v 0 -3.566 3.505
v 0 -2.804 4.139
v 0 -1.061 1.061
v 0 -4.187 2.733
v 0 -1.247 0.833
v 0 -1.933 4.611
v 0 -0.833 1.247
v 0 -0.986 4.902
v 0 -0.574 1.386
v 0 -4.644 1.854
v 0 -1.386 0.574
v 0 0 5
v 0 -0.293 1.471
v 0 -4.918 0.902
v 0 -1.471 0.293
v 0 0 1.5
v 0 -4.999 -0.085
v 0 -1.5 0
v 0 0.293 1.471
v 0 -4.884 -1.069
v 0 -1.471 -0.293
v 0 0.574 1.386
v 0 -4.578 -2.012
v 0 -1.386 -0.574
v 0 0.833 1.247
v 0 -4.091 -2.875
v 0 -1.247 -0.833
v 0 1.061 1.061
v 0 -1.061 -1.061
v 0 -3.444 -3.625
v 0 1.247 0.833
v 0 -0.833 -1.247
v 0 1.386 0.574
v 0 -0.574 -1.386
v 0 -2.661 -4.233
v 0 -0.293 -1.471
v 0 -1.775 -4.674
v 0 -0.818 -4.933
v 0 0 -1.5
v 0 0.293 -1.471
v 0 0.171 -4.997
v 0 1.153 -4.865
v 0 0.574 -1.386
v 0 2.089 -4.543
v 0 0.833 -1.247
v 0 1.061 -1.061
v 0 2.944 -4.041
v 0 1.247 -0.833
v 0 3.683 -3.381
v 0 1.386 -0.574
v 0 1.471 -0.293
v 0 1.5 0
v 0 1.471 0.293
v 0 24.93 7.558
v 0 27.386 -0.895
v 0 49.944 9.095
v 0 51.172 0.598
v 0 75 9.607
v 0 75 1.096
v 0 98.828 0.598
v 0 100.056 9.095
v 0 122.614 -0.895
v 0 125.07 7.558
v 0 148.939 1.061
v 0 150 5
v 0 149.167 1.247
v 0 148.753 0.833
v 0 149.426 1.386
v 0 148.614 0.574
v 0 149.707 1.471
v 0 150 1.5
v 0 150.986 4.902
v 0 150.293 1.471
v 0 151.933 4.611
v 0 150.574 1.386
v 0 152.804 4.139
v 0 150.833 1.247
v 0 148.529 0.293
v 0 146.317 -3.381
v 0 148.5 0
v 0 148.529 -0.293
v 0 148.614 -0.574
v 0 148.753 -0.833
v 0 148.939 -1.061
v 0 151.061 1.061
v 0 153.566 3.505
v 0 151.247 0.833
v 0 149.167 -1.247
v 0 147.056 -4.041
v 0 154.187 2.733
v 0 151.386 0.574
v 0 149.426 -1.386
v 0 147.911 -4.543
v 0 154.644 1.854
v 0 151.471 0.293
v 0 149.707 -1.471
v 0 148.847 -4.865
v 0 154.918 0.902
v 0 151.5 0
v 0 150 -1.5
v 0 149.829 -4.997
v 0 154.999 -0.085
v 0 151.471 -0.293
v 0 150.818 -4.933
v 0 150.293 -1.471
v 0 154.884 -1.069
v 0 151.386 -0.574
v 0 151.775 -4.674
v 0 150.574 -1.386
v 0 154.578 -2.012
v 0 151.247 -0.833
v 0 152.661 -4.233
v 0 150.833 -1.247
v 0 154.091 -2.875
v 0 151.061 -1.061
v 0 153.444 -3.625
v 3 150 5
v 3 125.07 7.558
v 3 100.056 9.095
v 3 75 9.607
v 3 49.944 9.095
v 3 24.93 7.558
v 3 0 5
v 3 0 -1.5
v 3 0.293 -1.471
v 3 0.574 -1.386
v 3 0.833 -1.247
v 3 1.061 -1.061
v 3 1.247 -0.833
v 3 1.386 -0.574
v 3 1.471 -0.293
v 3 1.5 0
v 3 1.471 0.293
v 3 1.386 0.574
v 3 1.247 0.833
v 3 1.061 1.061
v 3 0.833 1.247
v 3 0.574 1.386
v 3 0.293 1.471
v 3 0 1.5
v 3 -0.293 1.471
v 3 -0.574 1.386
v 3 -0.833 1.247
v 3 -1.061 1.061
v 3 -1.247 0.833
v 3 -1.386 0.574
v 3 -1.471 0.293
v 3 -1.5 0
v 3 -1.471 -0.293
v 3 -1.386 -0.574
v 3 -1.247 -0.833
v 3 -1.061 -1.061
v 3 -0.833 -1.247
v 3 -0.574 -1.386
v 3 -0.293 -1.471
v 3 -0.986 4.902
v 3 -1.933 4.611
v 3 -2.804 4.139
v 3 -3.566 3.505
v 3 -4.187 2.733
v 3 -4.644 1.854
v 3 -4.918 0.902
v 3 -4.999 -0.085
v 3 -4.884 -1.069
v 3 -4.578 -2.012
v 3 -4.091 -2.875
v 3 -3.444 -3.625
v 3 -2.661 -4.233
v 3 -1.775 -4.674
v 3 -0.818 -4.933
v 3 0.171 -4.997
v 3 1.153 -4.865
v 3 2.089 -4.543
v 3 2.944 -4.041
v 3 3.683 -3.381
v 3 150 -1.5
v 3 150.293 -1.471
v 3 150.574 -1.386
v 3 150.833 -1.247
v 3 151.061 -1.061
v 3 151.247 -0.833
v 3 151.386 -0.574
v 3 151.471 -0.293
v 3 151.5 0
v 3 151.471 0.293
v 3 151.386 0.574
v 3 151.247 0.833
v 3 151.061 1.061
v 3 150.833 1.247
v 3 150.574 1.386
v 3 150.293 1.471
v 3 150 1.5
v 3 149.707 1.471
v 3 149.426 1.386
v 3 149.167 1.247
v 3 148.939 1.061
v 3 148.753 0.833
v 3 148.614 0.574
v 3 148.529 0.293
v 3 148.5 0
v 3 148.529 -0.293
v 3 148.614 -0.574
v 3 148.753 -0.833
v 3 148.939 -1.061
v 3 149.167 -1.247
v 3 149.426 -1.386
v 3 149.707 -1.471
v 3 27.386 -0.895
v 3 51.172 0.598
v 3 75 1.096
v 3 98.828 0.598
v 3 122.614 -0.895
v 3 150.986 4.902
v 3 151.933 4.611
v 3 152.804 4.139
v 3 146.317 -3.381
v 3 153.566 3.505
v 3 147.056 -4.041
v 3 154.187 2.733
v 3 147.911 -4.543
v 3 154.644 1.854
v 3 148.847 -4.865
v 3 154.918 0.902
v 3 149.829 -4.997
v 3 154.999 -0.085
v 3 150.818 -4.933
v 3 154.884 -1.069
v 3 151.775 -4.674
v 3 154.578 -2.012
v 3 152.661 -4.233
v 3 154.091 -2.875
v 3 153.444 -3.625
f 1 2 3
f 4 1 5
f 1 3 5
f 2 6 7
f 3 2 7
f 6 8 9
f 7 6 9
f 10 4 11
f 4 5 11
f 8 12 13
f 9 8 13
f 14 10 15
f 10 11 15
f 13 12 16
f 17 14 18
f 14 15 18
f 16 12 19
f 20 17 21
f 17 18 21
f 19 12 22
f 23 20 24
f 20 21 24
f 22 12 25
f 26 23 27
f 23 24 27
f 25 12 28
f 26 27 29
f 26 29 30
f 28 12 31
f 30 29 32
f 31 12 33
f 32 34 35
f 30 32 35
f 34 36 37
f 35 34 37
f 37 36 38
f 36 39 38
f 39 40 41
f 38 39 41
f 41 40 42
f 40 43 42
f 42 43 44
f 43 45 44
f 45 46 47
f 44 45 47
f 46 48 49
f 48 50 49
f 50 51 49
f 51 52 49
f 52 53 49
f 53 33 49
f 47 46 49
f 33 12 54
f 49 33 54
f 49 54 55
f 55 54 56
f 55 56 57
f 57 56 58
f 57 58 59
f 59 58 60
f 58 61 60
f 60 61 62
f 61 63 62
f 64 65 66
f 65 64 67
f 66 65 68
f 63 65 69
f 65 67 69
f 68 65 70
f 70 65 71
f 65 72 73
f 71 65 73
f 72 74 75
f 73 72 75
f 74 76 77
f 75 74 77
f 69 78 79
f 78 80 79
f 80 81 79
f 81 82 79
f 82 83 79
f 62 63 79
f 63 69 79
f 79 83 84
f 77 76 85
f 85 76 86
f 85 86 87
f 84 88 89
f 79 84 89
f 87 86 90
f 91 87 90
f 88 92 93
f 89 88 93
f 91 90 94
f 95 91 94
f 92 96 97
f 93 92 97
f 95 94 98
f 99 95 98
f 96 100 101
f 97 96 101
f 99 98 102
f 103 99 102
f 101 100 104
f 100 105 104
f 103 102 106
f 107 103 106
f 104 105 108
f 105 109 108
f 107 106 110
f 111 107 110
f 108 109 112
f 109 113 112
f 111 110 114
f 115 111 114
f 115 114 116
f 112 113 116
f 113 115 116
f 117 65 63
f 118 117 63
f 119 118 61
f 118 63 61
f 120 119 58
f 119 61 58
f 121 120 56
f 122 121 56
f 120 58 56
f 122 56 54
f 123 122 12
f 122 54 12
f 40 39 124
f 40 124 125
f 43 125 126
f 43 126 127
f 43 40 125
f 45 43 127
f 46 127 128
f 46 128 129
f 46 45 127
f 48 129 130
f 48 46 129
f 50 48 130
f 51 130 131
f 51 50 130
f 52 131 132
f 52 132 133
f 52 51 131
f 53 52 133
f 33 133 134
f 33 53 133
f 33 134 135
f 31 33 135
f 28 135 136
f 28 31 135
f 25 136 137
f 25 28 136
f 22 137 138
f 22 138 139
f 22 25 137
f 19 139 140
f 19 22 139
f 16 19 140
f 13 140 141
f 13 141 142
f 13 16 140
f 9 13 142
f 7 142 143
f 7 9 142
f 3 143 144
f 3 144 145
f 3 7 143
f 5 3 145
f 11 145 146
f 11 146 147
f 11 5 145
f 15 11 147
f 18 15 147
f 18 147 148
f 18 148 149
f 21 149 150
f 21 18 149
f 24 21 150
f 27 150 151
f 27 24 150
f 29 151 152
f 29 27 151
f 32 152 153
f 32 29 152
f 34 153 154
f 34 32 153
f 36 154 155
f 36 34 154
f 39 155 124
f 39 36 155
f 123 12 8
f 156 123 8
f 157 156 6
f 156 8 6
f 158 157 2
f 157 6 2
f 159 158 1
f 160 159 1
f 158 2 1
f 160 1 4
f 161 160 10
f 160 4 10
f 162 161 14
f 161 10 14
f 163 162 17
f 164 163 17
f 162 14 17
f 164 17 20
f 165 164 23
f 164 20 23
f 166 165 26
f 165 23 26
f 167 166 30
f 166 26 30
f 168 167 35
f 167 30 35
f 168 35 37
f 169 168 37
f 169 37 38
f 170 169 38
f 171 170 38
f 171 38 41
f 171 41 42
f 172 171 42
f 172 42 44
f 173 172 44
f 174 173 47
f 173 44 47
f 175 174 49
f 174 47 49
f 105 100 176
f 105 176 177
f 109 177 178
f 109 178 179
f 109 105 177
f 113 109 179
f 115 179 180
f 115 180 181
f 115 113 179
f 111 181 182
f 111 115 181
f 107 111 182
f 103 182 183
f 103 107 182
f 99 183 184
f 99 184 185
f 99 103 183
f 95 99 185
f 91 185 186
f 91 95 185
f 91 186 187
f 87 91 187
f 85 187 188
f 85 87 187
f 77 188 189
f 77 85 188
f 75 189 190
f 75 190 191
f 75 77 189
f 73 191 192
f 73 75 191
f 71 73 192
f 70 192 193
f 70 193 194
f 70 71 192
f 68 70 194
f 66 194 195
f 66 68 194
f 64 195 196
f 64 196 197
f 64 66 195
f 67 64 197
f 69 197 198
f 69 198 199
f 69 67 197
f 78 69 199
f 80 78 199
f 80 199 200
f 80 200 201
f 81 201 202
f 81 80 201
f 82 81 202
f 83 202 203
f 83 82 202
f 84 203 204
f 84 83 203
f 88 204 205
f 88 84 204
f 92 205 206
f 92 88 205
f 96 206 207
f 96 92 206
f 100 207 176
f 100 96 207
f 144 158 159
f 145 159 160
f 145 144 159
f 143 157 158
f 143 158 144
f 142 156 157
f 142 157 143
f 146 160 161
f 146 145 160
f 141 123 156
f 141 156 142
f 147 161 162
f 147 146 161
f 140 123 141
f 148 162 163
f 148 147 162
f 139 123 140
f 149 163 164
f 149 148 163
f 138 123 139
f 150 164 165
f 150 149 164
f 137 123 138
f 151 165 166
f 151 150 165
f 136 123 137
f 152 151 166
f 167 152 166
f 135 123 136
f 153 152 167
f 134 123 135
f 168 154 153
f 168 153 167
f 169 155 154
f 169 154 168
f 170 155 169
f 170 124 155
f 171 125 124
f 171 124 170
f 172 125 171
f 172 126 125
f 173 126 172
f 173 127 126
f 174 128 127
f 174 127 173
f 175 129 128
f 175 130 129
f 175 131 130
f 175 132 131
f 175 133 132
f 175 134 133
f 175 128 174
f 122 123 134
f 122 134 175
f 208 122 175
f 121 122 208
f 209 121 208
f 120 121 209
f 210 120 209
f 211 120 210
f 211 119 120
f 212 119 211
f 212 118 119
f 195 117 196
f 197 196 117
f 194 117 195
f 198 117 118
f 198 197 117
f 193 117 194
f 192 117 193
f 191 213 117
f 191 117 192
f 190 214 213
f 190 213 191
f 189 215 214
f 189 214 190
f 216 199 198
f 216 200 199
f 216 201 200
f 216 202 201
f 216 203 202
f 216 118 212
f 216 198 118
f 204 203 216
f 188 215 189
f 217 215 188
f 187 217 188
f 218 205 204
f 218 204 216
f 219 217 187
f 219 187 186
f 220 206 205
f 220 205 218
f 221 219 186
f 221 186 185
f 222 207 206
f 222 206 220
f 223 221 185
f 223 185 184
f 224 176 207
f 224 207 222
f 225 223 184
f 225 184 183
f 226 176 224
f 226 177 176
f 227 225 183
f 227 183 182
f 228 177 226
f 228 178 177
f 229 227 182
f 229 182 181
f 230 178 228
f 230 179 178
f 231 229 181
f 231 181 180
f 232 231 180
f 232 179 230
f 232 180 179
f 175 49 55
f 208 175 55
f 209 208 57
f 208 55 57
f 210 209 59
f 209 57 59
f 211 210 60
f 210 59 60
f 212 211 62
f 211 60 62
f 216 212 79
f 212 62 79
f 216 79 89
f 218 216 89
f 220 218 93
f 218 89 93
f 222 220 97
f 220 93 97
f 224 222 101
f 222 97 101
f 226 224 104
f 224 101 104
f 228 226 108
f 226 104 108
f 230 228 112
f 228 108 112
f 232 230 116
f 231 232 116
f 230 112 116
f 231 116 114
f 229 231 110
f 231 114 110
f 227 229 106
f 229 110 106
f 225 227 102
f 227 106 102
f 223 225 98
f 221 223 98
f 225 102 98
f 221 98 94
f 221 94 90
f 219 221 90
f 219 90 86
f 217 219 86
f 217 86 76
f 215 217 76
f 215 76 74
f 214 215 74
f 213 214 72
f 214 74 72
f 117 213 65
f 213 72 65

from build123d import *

# Parameters (mm, degrees)
CROQUIS1_R              = 1.5
SALIENTE_EXTRUIR1_DEPTH = 3


with BuildPart() as part:
    # Croquis1 → Saliente-Extruir1 (new body)
    with BuildSketch(Plane(origin=(0, 0, 0), x_dir=(0, 0, -1), z_dir=(1, 0, 0))):
        with BuildLine():
            ThreePointArc((-5, 0), (2.011533945, -4.57752457), (3.381492475, 3.683138423))
            ThreePointArc((3.381492475, 3.683138423), (-1.096196525, 75), (3.381492475, 146.316861577))
            ThreePointArc((3.381492475, 146.316861577), (2.011533945, 154.57752457), (-5, 150))
            ThreePointArc((-5, 150), (-9.607489913, 75), (-5, 0))
        make_face()
        with Locations((0, 150)):
            Circle(CROQUIS1_R, mode=Mode.SUBTRACT)
        Circle(CROQUIS1_R, mode=Mode.SUBTRACT)
    extrude(amount=SALIENTE_EXTRUIR1_DEPTH)


solid = part.part
